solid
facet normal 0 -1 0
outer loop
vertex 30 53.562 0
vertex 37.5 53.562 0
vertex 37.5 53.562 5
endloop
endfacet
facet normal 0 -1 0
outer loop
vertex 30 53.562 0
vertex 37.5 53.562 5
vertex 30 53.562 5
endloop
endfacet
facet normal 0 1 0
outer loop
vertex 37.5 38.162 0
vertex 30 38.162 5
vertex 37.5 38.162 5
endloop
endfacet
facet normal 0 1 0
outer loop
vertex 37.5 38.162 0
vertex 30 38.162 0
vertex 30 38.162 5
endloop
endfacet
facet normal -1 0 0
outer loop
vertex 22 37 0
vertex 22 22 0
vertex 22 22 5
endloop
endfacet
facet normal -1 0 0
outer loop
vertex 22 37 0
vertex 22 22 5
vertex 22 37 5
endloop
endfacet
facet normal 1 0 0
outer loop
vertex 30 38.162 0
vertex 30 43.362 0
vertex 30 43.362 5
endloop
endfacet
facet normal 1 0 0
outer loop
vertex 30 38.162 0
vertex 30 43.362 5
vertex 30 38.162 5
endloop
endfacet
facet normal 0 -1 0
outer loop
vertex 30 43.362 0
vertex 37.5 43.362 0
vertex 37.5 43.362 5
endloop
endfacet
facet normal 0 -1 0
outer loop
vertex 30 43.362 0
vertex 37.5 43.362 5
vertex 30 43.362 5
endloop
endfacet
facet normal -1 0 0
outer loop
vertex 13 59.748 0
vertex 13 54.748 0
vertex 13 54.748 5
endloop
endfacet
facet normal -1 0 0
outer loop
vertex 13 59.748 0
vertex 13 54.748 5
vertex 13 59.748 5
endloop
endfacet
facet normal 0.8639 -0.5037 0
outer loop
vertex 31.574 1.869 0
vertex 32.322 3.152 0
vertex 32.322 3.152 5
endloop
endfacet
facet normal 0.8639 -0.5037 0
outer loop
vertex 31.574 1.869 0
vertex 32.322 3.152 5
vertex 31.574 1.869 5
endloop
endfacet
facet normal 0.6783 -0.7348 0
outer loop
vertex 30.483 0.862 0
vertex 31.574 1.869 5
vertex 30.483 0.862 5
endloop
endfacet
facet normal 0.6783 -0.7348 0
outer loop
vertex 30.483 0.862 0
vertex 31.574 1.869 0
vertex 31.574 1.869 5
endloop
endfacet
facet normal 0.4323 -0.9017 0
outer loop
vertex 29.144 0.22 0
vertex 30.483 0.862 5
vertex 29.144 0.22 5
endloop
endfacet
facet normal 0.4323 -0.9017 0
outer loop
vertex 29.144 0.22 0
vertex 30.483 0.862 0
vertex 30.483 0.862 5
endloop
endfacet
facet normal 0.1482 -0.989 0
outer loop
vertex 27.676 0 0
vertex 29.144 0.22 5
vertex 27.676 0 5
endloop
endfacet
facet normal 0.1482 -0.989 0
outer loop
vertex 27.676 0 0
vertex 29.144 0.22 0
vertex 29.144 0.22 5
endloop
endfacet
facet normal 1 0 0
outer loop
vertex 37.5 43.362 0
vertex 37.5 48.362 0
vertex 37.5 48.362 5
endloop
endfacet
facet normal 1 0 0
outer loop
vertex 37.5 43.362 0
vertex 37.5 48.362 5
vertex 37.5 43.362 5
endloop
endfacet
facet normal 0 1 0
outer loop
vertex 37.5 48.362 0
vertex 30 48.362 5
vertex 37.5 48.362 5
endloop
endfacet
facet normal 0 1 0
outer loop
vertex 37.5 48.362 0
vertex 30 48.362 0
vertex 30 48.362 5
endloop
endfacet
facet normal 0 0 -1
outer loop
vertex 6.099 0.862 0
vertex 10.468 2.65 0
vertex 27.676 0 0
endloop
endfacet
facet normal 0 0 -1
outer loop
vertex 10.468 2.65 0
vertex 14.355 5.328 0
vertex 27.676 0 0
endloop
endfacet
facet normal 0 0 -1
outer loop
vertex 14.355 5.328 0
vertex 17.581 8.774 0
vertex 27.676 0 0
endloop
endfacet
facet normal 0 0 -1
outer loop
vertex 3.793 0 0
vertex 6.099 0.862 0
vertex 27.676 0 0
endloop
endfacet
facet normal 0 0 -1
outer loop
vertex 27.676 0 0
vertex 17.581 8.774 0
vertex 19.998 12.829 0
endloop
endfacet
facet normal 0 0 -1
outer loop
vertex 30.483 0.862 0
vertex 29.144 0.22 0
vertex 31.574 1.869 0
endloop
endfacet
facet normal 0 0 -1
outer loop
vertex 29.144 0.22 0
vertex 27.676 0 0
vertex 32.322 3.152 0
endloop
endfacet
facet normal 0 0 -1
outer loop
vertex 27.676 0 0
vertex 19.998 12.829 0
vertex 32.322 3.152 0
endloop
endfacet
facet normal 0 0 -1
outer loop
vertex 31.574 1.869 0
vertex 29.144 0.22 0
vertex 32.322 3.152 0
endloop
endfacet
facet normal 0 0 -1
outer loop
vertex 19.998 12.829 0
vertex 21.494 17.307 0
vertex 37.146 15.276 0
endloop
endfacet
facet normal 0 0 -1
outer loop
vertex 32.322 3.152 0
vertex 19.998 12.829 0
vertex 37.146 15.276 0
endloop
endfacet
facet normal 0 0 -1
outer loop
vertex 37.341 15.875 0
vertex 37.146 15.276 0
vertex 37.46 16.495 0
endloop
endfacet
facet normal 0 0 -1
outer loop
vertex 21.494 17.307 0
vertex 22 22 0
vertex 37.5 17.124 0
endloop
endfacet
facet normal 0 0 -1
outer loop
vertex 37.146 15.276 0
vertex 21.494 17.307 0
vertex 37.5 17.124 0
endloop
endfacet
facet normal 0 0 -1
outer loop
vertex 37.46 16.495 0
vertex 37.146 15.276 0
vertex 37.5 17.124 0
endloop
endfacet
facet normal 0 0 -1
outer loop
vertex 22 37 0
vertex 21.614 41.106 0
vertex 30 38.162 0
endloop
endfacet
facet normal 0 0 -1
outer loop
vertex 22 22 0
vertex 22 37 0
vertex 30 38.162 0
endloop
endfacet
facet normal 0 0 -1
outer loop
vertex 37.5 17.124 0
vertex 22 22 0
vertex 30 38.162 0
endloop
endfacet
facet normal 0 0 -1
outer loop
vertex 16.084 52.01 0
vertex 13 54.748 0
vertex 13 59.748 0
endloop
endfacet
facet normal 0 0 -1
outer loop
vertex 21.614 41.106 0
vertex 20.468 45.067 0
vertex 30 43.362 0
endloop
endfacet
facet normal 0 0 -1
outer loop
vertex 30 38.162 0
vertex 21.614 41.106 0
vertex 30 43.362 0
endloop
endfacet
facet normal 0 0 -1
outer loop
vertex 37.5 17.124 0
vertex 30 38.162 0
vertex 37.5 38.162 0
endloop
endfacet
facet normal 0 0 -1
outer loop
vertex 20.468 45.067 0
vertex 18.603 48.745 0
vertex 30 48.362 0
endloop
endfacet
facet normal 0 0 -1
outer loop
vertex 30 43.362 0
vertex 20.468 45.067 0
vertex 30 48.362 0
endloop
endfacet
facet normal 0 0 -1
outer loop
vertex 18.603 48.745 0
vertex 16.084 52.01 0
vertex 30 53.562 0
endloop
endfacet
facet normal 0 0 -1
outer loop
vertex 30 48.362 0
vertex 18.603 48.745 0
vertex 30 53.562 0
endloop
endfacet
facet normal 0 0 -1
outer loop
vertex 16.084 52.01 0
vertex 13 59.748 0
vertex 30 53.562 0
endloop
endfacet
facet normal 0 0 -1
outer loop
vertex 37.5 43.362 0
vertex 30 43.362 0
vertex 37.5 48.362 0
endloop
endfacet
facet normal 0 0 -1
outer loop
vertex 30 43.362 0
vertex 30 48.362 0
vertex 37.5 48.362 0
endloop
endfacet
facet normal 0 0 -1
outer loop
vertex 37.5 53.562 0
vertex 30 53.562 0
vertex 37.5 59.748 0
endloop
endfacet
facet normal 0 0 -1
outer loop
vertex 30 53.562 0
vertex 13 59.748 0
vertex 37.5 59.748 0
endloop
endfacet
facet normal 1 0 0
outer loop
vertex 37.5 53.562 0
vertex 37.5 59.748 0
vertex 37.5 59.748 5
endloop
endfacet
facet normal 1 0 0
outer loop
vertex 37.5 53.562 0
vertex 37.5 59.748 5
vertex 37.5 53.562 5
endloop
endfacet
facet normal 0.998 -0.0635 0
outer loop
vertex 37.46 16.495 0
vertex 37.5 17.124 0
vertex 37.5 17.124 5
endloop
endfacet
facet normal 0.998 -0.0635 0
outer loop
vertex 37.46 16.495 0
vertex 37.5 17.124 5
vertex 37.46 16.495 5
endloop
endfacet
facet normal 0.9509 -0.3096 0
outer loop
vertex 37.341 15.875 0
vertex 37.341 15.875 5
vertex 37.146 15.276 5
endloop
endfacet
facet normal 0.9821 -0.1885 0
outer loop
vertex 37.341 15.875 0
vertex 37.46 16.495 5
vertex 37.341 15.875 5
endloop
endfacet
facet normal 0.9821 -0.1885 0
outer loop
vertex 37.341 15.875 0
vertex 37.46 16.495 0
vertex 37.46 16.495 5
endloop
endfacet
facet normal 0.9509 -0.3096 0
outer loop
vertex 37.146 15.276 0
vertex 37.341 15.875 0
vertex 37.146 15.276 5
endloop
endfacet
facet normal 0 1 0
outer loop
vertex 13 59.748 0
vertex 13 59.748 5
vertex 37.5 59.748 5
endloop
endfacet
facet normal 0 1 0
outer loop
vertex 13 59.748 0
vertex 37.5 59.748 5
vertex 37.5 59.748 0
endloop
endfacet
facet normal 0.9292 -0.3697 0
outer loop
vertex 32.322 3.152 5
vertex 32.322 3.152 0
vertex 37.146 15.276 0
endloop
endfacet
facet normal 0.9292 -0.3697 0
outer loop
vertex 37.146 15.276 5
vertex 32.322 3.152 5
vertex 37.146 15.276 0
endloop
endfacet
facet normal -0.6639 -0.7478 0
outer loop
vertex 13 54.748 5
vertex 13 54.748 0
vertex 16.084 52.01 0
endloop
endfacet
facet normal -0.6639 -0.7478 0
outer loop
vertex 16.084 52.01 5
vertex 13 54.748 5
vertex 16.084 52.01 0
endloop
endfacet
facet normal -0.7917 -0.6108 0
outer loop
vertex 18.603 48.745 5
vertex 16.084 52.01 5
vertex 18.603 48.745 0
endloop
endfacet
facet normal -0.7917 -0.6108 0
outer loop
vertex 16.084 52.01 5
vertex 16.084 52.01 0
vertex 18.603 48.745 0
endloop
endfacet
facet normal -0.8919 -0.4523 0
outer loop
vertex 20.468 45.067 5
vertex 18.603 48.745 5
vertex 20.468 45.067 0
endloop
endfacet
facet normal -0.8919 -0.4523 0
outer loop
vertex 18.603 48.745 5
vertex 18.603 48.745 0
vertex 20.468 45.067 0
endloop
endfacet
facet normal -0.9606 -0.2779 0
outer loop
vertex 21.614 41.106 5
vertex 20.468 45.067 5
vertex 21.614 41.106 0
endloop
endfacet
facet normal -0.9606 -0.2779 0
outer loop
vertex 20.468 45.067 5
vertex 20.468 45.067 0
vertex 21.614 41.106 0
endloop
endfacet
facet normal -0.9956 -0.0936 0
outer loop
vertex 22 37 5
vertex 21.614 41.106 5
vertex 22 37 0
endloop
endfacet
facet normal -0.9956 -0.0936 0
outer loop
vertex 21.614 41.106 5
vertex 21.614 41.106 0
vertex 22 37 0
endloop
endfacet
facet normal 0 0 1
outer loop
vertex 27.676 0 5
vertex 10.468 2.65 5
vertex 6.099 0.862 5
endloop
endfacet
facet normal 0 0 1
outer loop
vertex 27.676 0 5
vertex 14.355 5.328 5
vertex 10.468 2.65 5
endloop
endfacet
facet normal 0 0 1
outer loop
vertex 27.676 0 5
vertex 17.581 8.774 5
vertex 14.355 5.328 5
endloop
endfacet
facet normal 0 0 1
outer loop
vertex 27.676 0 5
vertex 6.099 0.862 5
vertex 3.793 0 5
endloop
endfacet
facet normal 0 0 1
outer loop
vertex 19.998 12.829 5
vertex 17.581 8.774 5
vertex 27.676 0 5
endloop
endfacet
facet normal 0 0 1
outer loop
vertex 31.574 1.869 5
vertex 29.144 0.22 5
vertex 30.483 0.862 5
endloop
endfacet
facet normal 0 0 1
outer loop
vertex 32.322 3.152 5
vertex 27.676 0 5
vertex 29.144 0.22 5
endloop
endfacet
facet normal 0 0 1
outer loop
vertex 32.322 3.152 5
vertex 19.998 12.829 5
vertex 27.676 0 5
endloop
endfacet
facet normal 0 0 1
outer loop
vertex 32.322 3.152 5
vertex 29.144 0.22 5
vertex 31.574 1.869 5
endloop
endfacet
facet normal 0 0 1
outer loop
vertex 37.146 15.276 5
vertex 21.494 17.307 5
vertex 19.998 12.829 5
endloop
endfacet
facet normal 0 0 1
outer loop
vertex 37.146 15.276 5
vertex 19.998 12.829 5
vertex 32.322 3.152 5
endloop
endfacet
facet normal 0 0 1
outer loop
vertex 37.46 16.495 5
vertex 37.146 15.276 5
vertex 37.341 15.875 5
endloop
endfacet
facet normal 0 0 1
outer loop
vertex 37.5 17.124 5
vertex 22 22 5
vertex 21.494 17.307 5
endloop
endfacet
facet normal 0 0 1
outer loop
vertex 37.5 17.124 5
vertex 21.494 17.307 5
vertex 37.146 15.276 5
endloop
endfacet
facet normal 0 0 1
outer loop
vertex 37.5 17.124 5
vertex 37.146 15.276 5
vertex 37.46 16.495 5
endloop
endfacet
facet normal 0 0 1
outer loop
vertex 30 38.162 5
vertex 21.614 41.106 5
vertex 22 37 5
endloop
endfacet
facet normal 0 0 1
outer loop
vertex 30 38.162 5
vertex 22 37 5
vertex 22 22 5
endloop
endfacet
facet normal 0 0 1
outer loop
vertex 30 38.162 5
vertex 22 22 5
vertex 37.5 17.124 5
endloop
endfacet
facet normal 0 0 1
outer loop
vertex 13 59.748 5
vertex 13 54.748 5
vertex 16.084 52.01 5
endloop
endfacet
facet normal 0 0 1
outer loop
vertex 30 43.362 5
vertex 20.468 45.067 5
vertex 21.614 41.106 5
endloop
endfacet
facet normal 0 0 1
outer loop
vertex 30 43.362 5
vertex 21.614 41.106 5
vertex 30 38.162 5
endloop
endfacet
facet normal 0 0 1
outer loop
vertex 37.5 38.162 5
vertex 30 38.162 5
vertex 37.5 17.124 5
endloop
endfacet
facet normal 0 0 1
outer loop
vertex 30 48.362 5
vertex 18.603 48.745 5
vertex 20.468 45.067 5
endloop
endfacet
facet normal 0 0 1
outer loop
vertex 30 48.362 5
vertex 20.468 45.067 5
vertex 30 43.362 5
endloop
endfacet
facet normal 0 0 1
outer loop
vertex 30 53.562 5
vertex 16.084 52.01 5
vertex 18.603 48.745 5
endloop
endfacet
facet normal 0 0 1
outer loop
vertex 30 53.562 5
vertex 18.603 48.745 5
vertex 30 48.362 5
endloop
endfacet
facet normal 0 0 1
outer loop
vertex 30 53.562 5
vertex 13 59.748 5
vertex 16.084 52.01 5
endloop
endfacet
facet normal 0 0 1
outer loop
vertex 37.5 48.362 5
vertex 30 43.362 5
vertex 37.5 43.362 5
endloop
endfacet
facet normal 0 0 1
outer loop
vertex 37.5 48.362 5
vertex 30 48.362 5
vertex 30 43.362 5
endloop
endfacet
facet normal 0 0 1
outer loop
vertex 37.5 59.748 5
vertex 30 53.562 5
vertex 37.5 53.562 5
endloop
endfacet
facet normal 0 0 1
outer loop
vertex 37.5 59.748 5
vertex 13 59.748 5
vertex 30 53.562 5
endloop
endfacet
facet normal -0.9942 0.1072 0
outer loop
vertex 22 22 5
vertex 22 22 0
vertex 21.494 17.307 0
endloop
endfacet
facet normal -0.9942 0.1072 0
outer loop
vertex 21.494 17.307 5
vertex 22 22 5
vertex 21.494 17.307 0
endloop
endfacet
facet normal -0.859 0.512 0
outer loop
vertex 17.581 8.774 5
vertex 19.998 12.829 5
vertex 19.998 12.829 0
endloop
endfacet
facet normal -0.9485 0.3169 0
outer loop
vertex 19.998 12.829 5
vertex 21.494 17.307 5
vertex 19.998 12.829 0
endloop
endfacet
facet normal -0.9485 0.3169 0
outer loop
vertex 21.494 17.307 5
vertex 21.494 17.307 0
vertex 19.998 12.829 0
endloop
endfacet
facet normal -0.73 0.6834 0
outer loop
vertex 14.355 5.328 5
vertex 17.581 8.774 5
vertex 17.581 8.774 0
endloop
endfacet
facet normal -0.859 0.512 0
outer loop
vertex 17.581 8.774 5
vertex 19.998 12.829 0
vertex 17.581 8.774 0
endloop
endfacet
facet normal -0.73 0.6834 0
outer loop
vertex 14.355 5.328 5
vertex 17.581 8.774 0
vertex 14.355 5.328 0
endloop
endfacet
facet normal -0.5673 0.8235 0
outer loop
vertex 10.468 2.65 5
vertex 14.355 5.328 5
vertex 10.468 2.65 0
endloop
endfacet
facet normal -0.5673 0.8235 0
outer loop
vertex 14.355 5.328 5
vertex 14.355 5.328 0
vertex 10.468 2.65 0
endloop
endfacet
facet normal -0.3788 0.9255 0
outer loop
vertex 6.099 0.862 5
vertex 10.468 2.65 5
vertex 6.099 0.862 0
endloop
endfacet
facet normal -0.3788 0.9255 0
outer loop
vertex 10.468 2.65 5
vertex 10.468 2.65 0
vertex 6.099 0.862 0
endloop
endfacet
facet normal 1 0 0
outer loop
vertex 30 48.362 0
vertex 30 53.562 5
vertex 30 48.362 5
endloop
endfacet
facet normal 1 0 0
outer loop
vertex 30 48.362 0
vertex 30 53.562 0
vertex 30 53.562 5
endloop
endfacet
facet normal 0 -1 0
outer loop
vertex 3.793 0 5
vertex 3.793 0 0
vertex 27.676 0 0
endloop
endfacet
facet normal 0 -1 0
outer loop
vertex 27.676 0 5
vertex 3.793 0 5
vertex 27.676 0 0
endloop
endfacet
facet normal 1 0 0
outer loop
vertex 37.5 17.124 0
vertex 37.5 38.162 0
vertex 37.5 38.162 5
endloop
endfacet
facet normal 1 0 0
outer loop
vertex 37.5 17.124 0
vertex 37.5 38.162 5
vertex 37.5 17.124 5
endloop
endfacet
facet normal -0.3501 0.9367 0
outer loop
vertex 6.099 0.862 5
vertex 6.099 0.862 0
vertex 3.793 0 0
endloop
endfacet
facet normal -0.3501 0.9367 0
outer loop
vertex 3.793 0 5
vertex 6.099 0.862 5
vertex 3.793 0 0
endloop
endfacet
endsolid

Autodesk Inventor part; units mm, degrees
ref_plane "YZ Plane" through (0, 0, 0) normal (1, 0, 0) x (0, 1, 0)
ref_plane "XZ Plane" through (0, 0, 0) normal (0, 1, 0) x (-1, 0, 0)
ref_plane "XY Plane" through (0, 0, 0) normal (0, 0, 1) x (1, 0, 0)
sketch "Sketch1" plane through (0, 0, 0) normal (0, 0, 1) x (1, 0, 0)
  arc A0 (6.0987, 0.8622) -> (22, 22) centre (0, 22) ccw
  line L0 (22, 22) -> (22, 37)
  arc A1 (22, 37) -> (13, 54.7482) centre (0, 37) ccw
  line L1 (13, 54.7482) -> (13, 66.7482)
  line L2 (22.5, 90) -> (22.5, 66.7482)
  line L3 (22.5, 90) -> (37.5, 90)
  line L4 (13, 66.7482) -> (22.5, 66.7482)
  line L5 (32.3216, 3.1515) -> (37.1457, 15.2755)
  arc A2 (37.1457, 15.2755) -> (37.5, 17.1241) centre (32.5, 17.1241) ccw
  arc A3 (27.6759, 0) -> (32.3216, 3.1515) centre (27.6759, 5) ccw
  line L6 (37.5, 53.562) -> (30, 53.562)
  line L7 (30, 53.562) -> (30, 48.362)
  line L8 (30, 48.362) -> (37.5, 48.362)
  line L9 (37.5, 43.362) -> (30, 43.362)
  line L10 (30, 43.362) -> (30, 38.162)
  line L11 (30, 38.162) -> (37.5, 38.162)
  line L12 (37.5, 90) -> (37.5, 53.562)
  line L13 (37.5, 48.362) -> (37.5, 43.362)
  line L14 (37.5, 38.162) -> (37.5, 17.1241)
  line L15 (6.0987, 0.8622) -> (3.793, 0)
  line L16 (3.793, 0) -> (27.6759, 0)
  point P0 (0, 0)
  dimension "d0" = 22
  dimension "d1" = 90
  dimension "d2" = 0
  dimension "d3" = 15
  dimension "d4" = 0
  dimension "d5" = 13
  dimension "d6" = 22
  dimension "d7" = 12
  dimension "d8" = 22.5
  dimension "d10" = 90
  dimension "d11" = 37
  dimension "d12" = 5
  dimension "d13" = 12.1241
  dimension "d14" = 5.2
  dimension "d15" = 5.2
  dimension "d16" = 5
sketch "Sketch2" plane through (0, 0, 0) normal (0, 0, 1) x (1, 0, 0)
  point P0 (0, 0)
extrude "Extrusion1" add sketch "Sketch1" along normal blind 5
sketch "Sketch3" plane through (0, 0, 5) normal (0, 0, 1) x (1, 0, 0)
  line L0 (22.5, 90) -> (22.5, 66.7482) projected
  line L1 (37.5, 90) -> (22.5, 90) projected
  point P0 (0, 0)
  point P1 (30, 86.5)
  point P2 (30, 63.5)
  dimension "d20" = 23
  dimension "d21" = 7.5
  dimension "d22" = 7.5
  dimension "d23" = 3.5
hole "Hole1" at (30, 86.5, 5) at (30, 63.5, 5) direction (0, 0, -1) diameter 3.4 end through all
sketch "Sketch4" plane through (22.5, 66.7482, 0) normal (-1, 0, 0) x (0, 0, 1)
  point P0 (0, -66.7482)
sketch "Sketch5" plane through (13, 54.7482, 0) normal (-1, 0, 0) x (0, 0, 1)
  line L0 (-13.1984, 36.8887) -> (18.4276, 36.8887)
  line L1 (18.4276, 36.8887) -> (18.4276, 5)
  line L2 (18.4276, 5) -> (-13.1984, 5)
  line L3 (-13.1984, 5) -> (-13.1984, 36.8887)
  line L4 (0, 12) -> (5, 12) projected
  point P0 (0, -54.7482)
  dimension "d31" = 7
extrude "Extrusion2" cut sketch "Sketch5" against normal blind 40
properties part number "CenterFinger"
